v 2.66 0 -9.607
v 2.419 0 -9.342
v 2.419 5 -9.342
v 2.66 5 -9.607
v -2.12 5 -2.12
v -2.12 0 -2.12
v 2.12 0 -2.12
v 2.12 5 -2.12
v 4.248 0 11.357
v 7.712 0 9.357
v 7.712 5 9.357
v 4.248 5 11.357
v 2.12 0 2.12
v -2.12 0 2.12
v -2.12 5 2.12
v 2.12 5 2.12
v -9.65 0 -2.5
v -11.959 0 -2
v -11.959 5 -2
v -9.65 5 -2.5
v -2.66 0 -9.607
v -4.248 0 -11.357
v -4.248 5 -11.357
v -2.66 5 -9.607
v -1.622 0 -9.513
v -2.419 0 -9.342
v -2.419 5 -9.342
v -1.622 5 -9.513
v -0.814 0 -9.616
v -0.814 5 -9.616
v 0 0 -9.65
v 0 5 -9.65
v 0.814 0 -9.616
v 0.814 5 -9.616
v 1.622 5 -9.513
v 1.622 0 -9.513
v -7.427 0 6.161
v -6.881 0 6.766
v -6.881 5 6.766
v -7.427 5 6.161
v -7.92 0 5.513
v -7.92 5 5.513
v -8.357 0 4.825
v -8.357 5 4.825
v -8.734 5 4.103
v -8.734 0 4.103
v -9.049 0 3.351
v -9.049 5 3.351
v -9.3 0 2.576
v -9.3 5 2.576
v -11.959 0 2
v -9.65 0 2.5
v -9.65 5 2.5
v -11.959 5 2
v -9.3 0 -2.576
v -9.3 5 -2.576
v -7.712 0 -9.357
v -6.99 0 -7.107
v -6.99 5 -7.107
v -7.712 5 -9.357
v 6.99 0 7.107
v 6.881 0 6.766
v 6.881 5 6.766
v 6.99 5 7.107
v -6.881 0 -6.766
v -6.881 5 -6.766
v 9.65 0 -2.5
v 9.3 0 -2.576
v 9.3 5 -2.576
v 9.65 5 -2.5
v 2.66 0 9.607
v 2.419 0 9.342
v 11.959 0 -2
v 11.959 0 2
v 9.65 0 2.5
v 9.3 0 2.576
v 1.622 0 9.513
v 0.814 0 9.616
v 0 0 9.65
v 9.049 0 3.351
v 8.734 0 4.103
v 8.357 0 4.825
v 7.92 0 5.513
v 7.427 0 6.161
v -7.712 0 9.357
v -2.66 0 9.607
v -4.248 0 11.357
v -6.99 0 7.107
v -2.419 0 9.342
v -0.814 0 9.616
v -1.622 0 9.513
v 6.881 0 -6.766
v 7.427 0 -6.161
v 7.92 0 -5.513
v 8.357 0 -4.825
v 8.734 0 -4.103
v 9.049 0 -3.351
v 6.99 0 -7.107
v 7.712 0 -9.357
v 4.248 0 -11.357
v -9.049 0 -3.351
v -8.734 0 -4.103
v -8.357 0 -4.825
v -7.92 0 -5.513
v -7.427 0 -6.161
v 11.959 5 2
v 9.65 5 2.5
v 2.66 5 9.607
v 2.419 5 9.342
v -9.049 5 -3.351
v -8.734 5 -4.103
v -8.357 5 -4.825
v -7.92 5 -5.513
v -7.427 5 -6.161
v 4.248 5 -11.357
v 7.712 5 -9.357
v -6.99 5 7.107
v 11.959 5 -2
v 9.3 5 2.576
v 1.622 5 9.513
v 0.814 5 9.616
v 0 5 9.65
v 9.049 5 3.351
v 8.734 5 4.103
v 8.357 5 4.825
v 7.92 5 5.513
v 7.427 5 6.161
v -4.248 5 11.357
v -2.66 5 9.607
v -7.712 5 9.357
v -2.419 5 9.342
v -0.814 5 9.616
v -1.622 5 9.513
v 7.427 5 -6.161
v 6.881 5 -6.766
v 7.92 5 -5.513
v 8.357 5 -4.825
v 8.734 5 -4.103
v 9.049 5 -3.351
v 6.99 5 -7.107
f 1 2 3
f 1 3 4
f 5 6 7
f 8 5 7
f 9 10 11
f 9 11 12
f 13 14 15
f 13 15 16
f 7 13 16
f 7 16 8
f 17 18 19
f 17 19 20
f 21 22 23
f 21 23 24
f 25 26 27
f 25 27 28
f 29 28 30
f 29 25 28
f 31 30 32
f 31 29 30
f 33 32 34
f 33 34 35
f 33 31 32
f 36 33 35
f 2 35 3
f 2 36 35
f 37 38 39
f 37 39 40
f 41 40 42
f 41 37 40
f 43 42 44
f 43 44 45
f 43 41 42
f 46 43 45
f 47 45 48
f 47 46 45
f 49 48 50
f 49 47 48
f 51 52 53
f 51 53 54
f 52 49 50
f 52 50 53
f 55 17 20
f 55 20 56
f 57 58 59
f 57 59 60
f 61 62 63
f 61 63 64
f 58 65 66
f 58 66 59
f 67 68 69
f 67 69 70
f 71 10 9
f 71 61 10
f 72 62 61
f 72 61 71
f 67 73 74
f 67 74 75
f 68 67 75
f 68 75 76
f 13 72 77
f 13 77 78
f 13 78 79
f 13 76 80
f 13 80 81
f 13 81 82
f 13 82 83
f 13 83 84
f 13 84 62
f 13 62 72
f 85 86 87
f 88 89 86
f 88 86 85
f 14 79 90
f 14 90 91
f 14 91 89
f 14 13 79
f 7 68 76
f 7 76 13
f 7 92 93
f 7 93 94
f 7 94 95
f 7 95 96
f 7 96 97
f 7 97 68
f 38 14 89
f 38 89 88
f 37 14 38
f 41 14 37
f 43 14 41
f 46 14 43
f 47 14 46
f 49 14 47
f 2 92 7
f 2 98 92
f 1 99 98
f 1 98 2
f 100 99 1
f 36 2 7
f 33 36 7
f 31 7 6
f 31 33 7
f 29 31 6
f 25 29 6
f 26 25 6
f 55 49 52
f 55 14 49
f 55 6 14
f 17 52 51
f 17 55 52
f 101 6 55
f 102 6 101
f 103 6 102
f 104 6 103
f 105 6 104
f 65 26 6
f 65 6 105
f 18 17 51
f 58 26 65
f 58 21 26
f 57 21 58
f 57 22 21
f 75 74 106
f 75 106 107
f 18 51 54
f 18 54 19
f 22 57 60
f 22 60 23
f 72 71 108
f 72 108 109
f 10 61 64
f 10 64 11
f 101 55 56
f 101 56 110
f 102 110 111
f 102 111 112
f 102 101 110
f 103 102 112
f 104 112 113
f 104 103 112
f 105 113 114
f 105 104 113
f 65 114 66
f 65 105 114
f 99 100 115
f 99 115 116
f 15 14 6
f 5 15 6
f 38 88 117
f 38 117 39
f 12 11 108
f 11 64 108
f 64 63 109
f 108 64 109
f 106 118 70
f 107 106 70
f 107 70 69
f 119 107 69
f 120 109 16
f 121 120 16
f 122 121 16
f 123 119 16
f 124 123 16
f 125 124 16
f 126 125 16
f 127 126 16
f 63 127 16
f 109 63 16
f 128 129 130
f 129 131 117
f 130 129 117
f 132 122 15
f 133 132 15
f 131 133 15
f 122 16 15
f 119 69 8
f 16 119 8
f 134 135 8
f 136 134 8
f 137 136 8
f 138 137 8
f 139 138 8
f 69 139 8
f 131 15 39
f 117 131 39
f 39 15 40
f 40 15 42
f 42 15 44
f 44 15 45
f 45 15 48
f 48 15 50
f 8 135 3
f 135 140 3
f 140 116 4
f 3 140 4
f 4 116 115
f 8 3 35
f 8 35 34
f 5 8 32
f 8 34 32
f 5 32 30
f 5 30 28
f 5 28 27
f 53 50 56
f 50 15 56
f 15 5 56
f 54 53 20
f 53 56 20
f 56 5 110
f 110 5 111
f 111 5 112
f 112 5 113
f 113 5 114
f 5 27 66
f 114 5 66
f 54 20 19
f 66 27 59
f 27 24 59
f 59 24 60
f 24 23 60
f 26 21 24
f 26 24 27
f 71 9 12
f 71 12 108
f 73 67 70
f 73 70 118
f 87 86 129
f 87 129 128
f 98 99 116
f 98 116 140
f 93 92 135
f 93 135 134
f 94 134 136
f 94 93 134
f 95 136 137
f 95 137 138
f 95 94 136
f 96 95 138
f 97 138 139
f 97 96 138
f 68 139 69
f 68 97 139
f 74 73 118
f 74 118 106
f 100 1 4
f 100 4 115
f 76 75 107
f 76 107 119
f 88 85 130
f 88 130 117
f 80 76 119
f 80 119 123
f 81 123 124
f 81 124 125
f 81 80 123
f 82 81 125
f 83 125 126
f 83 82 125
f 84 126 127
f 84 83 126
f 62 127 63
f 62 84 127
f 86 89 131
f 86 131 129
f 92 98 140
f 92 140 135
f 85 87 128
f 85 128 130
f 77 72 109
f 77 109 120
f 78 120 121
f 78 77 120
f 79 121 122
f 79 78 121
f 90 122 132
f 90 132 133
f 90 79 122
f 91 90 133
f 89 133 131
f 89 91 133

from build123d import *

# Parameters (mm, degrees)
SKETCH2_W           = 4.24
SKETCH2_H           = 4.24
BOSS_EXTRUDE1_DEPTH = 5


with BuildPart() as part:
    # Sketch2 → Boss-Extrude1 (new body)
    with BuildSketch(Plane(origin=(0, 0, 0), x_dir=(1, 0, 0), z_dir=(0, 1, 0))):
        with BuildLine():
            Line((7.711630813, -9.356936378), (4.247529198, -11.356936378))
            Line((4.247529198, -11.356936378), (2.659936491, -9.607145147))
            Line((2.659936491, -9.607145147), (2.419219348, -9.341834817))
            ThreePointArc((2.419219348, -9.341834817), (0, -9.65), (-2.419219348, -9.341834817))
            Line((-2.419219348, -9.341834817), (-2.659936491, -9.607145147))
            Line((-2.659936491, -9.607145147), (-4.247529198, -11.356936378))
            Line((-4.247529198, -11.356936378), (-7.711630813, -9.356936378))
            Line((-7.711630813, -9.356936378), (-6.990063509, -7.107145147))
            Line((-6.990063509, -7.107145147), (-6.880656595, -6.766022821))
            ThreePointArc((-6.880656595, -6.766022821), (-8.357145147, -4.825), (-9.299875943, -2.575811995))
            Line((-9.299875943, -2.575811995), (-9.65, -2.5))
            Line((-9.65, -2.5), (-11.959160012, -2))
            Line((-11.959160012, -2), (-11.959160012, 2))
            Line((-11.959160012, 2), (-9.65, 2.5))
            Line((-9.65, 2.5), (-9.299875943, 2.575811995))
            ThreePointArc((-9.299875943, 2.575811995), (-8.357145147, 4.825), (-6.880656595, 6.766022821))
            Line((-6.880656595, 6.766022821), (-6.990063509, 7.107145147))
            Line((-6.990063509, 7.107145147), (-7.711630813, 9.356936378))
            Line((-7.711630813, 9.356936378), (-4.247529198, 11.356936378))
            Line((-4.247529198, 11.356936378), (-2.659936491, 9.607145147))
            Line((-2.659936491, 9.607145147), (-2.419219348, 9.341834817))
            ThreePointArc((-2.419219348, 9.341834817), (0, 9.65), (2.419219348, 9.341834817))
            Line((2.419219348, 9.341834817), (2.659936491, 9.607145147))
            Line((2.659936491, 9.607145147), (4.247529198, 11.356936378))
            Line((4.247529198, 11.356936378), (7.711630813, 9.356936378))
            Line((7.711630813, 9.356936378), (6.990063509, 7.107145147))
            Line((6.990063509, 7.107145147), (6.880656595, 6.766022821))
            ThreePointArc((6.880656595, 6.766022821), (8.357145147, 4.825), (9.299875943, 2.575811995))
            Line((9.299875943, 2.575811995), (9.65, 2.5))
            Line((9.65, 2.5), (11.959160012, 2))
            Line((11.959160012, 2), (11.959160012, -2))
            Line((11.959160012, -2), (9.65, -2.5))
            Line((9.65, -2.5), (9.299875943, -2.575811995))
            ThreePointArc((9.299875943, -2.575811995), (8.357145147, -4.825), (6.880656595, -6.766022821))
            Line((6.880656595, -6.766022821), (6.990063509, -7.107145147))
            Line((6.990063509, -7.107145147), (7.711630813, -9.356936378))
        make_face()
        Rectangle(SKETCH2_W, SKETCH2_H, mode=Mode.SUBTRACT)
    extrude(amount=BOSS_EXTRUDE1_DEPTH)


solid = part.part
